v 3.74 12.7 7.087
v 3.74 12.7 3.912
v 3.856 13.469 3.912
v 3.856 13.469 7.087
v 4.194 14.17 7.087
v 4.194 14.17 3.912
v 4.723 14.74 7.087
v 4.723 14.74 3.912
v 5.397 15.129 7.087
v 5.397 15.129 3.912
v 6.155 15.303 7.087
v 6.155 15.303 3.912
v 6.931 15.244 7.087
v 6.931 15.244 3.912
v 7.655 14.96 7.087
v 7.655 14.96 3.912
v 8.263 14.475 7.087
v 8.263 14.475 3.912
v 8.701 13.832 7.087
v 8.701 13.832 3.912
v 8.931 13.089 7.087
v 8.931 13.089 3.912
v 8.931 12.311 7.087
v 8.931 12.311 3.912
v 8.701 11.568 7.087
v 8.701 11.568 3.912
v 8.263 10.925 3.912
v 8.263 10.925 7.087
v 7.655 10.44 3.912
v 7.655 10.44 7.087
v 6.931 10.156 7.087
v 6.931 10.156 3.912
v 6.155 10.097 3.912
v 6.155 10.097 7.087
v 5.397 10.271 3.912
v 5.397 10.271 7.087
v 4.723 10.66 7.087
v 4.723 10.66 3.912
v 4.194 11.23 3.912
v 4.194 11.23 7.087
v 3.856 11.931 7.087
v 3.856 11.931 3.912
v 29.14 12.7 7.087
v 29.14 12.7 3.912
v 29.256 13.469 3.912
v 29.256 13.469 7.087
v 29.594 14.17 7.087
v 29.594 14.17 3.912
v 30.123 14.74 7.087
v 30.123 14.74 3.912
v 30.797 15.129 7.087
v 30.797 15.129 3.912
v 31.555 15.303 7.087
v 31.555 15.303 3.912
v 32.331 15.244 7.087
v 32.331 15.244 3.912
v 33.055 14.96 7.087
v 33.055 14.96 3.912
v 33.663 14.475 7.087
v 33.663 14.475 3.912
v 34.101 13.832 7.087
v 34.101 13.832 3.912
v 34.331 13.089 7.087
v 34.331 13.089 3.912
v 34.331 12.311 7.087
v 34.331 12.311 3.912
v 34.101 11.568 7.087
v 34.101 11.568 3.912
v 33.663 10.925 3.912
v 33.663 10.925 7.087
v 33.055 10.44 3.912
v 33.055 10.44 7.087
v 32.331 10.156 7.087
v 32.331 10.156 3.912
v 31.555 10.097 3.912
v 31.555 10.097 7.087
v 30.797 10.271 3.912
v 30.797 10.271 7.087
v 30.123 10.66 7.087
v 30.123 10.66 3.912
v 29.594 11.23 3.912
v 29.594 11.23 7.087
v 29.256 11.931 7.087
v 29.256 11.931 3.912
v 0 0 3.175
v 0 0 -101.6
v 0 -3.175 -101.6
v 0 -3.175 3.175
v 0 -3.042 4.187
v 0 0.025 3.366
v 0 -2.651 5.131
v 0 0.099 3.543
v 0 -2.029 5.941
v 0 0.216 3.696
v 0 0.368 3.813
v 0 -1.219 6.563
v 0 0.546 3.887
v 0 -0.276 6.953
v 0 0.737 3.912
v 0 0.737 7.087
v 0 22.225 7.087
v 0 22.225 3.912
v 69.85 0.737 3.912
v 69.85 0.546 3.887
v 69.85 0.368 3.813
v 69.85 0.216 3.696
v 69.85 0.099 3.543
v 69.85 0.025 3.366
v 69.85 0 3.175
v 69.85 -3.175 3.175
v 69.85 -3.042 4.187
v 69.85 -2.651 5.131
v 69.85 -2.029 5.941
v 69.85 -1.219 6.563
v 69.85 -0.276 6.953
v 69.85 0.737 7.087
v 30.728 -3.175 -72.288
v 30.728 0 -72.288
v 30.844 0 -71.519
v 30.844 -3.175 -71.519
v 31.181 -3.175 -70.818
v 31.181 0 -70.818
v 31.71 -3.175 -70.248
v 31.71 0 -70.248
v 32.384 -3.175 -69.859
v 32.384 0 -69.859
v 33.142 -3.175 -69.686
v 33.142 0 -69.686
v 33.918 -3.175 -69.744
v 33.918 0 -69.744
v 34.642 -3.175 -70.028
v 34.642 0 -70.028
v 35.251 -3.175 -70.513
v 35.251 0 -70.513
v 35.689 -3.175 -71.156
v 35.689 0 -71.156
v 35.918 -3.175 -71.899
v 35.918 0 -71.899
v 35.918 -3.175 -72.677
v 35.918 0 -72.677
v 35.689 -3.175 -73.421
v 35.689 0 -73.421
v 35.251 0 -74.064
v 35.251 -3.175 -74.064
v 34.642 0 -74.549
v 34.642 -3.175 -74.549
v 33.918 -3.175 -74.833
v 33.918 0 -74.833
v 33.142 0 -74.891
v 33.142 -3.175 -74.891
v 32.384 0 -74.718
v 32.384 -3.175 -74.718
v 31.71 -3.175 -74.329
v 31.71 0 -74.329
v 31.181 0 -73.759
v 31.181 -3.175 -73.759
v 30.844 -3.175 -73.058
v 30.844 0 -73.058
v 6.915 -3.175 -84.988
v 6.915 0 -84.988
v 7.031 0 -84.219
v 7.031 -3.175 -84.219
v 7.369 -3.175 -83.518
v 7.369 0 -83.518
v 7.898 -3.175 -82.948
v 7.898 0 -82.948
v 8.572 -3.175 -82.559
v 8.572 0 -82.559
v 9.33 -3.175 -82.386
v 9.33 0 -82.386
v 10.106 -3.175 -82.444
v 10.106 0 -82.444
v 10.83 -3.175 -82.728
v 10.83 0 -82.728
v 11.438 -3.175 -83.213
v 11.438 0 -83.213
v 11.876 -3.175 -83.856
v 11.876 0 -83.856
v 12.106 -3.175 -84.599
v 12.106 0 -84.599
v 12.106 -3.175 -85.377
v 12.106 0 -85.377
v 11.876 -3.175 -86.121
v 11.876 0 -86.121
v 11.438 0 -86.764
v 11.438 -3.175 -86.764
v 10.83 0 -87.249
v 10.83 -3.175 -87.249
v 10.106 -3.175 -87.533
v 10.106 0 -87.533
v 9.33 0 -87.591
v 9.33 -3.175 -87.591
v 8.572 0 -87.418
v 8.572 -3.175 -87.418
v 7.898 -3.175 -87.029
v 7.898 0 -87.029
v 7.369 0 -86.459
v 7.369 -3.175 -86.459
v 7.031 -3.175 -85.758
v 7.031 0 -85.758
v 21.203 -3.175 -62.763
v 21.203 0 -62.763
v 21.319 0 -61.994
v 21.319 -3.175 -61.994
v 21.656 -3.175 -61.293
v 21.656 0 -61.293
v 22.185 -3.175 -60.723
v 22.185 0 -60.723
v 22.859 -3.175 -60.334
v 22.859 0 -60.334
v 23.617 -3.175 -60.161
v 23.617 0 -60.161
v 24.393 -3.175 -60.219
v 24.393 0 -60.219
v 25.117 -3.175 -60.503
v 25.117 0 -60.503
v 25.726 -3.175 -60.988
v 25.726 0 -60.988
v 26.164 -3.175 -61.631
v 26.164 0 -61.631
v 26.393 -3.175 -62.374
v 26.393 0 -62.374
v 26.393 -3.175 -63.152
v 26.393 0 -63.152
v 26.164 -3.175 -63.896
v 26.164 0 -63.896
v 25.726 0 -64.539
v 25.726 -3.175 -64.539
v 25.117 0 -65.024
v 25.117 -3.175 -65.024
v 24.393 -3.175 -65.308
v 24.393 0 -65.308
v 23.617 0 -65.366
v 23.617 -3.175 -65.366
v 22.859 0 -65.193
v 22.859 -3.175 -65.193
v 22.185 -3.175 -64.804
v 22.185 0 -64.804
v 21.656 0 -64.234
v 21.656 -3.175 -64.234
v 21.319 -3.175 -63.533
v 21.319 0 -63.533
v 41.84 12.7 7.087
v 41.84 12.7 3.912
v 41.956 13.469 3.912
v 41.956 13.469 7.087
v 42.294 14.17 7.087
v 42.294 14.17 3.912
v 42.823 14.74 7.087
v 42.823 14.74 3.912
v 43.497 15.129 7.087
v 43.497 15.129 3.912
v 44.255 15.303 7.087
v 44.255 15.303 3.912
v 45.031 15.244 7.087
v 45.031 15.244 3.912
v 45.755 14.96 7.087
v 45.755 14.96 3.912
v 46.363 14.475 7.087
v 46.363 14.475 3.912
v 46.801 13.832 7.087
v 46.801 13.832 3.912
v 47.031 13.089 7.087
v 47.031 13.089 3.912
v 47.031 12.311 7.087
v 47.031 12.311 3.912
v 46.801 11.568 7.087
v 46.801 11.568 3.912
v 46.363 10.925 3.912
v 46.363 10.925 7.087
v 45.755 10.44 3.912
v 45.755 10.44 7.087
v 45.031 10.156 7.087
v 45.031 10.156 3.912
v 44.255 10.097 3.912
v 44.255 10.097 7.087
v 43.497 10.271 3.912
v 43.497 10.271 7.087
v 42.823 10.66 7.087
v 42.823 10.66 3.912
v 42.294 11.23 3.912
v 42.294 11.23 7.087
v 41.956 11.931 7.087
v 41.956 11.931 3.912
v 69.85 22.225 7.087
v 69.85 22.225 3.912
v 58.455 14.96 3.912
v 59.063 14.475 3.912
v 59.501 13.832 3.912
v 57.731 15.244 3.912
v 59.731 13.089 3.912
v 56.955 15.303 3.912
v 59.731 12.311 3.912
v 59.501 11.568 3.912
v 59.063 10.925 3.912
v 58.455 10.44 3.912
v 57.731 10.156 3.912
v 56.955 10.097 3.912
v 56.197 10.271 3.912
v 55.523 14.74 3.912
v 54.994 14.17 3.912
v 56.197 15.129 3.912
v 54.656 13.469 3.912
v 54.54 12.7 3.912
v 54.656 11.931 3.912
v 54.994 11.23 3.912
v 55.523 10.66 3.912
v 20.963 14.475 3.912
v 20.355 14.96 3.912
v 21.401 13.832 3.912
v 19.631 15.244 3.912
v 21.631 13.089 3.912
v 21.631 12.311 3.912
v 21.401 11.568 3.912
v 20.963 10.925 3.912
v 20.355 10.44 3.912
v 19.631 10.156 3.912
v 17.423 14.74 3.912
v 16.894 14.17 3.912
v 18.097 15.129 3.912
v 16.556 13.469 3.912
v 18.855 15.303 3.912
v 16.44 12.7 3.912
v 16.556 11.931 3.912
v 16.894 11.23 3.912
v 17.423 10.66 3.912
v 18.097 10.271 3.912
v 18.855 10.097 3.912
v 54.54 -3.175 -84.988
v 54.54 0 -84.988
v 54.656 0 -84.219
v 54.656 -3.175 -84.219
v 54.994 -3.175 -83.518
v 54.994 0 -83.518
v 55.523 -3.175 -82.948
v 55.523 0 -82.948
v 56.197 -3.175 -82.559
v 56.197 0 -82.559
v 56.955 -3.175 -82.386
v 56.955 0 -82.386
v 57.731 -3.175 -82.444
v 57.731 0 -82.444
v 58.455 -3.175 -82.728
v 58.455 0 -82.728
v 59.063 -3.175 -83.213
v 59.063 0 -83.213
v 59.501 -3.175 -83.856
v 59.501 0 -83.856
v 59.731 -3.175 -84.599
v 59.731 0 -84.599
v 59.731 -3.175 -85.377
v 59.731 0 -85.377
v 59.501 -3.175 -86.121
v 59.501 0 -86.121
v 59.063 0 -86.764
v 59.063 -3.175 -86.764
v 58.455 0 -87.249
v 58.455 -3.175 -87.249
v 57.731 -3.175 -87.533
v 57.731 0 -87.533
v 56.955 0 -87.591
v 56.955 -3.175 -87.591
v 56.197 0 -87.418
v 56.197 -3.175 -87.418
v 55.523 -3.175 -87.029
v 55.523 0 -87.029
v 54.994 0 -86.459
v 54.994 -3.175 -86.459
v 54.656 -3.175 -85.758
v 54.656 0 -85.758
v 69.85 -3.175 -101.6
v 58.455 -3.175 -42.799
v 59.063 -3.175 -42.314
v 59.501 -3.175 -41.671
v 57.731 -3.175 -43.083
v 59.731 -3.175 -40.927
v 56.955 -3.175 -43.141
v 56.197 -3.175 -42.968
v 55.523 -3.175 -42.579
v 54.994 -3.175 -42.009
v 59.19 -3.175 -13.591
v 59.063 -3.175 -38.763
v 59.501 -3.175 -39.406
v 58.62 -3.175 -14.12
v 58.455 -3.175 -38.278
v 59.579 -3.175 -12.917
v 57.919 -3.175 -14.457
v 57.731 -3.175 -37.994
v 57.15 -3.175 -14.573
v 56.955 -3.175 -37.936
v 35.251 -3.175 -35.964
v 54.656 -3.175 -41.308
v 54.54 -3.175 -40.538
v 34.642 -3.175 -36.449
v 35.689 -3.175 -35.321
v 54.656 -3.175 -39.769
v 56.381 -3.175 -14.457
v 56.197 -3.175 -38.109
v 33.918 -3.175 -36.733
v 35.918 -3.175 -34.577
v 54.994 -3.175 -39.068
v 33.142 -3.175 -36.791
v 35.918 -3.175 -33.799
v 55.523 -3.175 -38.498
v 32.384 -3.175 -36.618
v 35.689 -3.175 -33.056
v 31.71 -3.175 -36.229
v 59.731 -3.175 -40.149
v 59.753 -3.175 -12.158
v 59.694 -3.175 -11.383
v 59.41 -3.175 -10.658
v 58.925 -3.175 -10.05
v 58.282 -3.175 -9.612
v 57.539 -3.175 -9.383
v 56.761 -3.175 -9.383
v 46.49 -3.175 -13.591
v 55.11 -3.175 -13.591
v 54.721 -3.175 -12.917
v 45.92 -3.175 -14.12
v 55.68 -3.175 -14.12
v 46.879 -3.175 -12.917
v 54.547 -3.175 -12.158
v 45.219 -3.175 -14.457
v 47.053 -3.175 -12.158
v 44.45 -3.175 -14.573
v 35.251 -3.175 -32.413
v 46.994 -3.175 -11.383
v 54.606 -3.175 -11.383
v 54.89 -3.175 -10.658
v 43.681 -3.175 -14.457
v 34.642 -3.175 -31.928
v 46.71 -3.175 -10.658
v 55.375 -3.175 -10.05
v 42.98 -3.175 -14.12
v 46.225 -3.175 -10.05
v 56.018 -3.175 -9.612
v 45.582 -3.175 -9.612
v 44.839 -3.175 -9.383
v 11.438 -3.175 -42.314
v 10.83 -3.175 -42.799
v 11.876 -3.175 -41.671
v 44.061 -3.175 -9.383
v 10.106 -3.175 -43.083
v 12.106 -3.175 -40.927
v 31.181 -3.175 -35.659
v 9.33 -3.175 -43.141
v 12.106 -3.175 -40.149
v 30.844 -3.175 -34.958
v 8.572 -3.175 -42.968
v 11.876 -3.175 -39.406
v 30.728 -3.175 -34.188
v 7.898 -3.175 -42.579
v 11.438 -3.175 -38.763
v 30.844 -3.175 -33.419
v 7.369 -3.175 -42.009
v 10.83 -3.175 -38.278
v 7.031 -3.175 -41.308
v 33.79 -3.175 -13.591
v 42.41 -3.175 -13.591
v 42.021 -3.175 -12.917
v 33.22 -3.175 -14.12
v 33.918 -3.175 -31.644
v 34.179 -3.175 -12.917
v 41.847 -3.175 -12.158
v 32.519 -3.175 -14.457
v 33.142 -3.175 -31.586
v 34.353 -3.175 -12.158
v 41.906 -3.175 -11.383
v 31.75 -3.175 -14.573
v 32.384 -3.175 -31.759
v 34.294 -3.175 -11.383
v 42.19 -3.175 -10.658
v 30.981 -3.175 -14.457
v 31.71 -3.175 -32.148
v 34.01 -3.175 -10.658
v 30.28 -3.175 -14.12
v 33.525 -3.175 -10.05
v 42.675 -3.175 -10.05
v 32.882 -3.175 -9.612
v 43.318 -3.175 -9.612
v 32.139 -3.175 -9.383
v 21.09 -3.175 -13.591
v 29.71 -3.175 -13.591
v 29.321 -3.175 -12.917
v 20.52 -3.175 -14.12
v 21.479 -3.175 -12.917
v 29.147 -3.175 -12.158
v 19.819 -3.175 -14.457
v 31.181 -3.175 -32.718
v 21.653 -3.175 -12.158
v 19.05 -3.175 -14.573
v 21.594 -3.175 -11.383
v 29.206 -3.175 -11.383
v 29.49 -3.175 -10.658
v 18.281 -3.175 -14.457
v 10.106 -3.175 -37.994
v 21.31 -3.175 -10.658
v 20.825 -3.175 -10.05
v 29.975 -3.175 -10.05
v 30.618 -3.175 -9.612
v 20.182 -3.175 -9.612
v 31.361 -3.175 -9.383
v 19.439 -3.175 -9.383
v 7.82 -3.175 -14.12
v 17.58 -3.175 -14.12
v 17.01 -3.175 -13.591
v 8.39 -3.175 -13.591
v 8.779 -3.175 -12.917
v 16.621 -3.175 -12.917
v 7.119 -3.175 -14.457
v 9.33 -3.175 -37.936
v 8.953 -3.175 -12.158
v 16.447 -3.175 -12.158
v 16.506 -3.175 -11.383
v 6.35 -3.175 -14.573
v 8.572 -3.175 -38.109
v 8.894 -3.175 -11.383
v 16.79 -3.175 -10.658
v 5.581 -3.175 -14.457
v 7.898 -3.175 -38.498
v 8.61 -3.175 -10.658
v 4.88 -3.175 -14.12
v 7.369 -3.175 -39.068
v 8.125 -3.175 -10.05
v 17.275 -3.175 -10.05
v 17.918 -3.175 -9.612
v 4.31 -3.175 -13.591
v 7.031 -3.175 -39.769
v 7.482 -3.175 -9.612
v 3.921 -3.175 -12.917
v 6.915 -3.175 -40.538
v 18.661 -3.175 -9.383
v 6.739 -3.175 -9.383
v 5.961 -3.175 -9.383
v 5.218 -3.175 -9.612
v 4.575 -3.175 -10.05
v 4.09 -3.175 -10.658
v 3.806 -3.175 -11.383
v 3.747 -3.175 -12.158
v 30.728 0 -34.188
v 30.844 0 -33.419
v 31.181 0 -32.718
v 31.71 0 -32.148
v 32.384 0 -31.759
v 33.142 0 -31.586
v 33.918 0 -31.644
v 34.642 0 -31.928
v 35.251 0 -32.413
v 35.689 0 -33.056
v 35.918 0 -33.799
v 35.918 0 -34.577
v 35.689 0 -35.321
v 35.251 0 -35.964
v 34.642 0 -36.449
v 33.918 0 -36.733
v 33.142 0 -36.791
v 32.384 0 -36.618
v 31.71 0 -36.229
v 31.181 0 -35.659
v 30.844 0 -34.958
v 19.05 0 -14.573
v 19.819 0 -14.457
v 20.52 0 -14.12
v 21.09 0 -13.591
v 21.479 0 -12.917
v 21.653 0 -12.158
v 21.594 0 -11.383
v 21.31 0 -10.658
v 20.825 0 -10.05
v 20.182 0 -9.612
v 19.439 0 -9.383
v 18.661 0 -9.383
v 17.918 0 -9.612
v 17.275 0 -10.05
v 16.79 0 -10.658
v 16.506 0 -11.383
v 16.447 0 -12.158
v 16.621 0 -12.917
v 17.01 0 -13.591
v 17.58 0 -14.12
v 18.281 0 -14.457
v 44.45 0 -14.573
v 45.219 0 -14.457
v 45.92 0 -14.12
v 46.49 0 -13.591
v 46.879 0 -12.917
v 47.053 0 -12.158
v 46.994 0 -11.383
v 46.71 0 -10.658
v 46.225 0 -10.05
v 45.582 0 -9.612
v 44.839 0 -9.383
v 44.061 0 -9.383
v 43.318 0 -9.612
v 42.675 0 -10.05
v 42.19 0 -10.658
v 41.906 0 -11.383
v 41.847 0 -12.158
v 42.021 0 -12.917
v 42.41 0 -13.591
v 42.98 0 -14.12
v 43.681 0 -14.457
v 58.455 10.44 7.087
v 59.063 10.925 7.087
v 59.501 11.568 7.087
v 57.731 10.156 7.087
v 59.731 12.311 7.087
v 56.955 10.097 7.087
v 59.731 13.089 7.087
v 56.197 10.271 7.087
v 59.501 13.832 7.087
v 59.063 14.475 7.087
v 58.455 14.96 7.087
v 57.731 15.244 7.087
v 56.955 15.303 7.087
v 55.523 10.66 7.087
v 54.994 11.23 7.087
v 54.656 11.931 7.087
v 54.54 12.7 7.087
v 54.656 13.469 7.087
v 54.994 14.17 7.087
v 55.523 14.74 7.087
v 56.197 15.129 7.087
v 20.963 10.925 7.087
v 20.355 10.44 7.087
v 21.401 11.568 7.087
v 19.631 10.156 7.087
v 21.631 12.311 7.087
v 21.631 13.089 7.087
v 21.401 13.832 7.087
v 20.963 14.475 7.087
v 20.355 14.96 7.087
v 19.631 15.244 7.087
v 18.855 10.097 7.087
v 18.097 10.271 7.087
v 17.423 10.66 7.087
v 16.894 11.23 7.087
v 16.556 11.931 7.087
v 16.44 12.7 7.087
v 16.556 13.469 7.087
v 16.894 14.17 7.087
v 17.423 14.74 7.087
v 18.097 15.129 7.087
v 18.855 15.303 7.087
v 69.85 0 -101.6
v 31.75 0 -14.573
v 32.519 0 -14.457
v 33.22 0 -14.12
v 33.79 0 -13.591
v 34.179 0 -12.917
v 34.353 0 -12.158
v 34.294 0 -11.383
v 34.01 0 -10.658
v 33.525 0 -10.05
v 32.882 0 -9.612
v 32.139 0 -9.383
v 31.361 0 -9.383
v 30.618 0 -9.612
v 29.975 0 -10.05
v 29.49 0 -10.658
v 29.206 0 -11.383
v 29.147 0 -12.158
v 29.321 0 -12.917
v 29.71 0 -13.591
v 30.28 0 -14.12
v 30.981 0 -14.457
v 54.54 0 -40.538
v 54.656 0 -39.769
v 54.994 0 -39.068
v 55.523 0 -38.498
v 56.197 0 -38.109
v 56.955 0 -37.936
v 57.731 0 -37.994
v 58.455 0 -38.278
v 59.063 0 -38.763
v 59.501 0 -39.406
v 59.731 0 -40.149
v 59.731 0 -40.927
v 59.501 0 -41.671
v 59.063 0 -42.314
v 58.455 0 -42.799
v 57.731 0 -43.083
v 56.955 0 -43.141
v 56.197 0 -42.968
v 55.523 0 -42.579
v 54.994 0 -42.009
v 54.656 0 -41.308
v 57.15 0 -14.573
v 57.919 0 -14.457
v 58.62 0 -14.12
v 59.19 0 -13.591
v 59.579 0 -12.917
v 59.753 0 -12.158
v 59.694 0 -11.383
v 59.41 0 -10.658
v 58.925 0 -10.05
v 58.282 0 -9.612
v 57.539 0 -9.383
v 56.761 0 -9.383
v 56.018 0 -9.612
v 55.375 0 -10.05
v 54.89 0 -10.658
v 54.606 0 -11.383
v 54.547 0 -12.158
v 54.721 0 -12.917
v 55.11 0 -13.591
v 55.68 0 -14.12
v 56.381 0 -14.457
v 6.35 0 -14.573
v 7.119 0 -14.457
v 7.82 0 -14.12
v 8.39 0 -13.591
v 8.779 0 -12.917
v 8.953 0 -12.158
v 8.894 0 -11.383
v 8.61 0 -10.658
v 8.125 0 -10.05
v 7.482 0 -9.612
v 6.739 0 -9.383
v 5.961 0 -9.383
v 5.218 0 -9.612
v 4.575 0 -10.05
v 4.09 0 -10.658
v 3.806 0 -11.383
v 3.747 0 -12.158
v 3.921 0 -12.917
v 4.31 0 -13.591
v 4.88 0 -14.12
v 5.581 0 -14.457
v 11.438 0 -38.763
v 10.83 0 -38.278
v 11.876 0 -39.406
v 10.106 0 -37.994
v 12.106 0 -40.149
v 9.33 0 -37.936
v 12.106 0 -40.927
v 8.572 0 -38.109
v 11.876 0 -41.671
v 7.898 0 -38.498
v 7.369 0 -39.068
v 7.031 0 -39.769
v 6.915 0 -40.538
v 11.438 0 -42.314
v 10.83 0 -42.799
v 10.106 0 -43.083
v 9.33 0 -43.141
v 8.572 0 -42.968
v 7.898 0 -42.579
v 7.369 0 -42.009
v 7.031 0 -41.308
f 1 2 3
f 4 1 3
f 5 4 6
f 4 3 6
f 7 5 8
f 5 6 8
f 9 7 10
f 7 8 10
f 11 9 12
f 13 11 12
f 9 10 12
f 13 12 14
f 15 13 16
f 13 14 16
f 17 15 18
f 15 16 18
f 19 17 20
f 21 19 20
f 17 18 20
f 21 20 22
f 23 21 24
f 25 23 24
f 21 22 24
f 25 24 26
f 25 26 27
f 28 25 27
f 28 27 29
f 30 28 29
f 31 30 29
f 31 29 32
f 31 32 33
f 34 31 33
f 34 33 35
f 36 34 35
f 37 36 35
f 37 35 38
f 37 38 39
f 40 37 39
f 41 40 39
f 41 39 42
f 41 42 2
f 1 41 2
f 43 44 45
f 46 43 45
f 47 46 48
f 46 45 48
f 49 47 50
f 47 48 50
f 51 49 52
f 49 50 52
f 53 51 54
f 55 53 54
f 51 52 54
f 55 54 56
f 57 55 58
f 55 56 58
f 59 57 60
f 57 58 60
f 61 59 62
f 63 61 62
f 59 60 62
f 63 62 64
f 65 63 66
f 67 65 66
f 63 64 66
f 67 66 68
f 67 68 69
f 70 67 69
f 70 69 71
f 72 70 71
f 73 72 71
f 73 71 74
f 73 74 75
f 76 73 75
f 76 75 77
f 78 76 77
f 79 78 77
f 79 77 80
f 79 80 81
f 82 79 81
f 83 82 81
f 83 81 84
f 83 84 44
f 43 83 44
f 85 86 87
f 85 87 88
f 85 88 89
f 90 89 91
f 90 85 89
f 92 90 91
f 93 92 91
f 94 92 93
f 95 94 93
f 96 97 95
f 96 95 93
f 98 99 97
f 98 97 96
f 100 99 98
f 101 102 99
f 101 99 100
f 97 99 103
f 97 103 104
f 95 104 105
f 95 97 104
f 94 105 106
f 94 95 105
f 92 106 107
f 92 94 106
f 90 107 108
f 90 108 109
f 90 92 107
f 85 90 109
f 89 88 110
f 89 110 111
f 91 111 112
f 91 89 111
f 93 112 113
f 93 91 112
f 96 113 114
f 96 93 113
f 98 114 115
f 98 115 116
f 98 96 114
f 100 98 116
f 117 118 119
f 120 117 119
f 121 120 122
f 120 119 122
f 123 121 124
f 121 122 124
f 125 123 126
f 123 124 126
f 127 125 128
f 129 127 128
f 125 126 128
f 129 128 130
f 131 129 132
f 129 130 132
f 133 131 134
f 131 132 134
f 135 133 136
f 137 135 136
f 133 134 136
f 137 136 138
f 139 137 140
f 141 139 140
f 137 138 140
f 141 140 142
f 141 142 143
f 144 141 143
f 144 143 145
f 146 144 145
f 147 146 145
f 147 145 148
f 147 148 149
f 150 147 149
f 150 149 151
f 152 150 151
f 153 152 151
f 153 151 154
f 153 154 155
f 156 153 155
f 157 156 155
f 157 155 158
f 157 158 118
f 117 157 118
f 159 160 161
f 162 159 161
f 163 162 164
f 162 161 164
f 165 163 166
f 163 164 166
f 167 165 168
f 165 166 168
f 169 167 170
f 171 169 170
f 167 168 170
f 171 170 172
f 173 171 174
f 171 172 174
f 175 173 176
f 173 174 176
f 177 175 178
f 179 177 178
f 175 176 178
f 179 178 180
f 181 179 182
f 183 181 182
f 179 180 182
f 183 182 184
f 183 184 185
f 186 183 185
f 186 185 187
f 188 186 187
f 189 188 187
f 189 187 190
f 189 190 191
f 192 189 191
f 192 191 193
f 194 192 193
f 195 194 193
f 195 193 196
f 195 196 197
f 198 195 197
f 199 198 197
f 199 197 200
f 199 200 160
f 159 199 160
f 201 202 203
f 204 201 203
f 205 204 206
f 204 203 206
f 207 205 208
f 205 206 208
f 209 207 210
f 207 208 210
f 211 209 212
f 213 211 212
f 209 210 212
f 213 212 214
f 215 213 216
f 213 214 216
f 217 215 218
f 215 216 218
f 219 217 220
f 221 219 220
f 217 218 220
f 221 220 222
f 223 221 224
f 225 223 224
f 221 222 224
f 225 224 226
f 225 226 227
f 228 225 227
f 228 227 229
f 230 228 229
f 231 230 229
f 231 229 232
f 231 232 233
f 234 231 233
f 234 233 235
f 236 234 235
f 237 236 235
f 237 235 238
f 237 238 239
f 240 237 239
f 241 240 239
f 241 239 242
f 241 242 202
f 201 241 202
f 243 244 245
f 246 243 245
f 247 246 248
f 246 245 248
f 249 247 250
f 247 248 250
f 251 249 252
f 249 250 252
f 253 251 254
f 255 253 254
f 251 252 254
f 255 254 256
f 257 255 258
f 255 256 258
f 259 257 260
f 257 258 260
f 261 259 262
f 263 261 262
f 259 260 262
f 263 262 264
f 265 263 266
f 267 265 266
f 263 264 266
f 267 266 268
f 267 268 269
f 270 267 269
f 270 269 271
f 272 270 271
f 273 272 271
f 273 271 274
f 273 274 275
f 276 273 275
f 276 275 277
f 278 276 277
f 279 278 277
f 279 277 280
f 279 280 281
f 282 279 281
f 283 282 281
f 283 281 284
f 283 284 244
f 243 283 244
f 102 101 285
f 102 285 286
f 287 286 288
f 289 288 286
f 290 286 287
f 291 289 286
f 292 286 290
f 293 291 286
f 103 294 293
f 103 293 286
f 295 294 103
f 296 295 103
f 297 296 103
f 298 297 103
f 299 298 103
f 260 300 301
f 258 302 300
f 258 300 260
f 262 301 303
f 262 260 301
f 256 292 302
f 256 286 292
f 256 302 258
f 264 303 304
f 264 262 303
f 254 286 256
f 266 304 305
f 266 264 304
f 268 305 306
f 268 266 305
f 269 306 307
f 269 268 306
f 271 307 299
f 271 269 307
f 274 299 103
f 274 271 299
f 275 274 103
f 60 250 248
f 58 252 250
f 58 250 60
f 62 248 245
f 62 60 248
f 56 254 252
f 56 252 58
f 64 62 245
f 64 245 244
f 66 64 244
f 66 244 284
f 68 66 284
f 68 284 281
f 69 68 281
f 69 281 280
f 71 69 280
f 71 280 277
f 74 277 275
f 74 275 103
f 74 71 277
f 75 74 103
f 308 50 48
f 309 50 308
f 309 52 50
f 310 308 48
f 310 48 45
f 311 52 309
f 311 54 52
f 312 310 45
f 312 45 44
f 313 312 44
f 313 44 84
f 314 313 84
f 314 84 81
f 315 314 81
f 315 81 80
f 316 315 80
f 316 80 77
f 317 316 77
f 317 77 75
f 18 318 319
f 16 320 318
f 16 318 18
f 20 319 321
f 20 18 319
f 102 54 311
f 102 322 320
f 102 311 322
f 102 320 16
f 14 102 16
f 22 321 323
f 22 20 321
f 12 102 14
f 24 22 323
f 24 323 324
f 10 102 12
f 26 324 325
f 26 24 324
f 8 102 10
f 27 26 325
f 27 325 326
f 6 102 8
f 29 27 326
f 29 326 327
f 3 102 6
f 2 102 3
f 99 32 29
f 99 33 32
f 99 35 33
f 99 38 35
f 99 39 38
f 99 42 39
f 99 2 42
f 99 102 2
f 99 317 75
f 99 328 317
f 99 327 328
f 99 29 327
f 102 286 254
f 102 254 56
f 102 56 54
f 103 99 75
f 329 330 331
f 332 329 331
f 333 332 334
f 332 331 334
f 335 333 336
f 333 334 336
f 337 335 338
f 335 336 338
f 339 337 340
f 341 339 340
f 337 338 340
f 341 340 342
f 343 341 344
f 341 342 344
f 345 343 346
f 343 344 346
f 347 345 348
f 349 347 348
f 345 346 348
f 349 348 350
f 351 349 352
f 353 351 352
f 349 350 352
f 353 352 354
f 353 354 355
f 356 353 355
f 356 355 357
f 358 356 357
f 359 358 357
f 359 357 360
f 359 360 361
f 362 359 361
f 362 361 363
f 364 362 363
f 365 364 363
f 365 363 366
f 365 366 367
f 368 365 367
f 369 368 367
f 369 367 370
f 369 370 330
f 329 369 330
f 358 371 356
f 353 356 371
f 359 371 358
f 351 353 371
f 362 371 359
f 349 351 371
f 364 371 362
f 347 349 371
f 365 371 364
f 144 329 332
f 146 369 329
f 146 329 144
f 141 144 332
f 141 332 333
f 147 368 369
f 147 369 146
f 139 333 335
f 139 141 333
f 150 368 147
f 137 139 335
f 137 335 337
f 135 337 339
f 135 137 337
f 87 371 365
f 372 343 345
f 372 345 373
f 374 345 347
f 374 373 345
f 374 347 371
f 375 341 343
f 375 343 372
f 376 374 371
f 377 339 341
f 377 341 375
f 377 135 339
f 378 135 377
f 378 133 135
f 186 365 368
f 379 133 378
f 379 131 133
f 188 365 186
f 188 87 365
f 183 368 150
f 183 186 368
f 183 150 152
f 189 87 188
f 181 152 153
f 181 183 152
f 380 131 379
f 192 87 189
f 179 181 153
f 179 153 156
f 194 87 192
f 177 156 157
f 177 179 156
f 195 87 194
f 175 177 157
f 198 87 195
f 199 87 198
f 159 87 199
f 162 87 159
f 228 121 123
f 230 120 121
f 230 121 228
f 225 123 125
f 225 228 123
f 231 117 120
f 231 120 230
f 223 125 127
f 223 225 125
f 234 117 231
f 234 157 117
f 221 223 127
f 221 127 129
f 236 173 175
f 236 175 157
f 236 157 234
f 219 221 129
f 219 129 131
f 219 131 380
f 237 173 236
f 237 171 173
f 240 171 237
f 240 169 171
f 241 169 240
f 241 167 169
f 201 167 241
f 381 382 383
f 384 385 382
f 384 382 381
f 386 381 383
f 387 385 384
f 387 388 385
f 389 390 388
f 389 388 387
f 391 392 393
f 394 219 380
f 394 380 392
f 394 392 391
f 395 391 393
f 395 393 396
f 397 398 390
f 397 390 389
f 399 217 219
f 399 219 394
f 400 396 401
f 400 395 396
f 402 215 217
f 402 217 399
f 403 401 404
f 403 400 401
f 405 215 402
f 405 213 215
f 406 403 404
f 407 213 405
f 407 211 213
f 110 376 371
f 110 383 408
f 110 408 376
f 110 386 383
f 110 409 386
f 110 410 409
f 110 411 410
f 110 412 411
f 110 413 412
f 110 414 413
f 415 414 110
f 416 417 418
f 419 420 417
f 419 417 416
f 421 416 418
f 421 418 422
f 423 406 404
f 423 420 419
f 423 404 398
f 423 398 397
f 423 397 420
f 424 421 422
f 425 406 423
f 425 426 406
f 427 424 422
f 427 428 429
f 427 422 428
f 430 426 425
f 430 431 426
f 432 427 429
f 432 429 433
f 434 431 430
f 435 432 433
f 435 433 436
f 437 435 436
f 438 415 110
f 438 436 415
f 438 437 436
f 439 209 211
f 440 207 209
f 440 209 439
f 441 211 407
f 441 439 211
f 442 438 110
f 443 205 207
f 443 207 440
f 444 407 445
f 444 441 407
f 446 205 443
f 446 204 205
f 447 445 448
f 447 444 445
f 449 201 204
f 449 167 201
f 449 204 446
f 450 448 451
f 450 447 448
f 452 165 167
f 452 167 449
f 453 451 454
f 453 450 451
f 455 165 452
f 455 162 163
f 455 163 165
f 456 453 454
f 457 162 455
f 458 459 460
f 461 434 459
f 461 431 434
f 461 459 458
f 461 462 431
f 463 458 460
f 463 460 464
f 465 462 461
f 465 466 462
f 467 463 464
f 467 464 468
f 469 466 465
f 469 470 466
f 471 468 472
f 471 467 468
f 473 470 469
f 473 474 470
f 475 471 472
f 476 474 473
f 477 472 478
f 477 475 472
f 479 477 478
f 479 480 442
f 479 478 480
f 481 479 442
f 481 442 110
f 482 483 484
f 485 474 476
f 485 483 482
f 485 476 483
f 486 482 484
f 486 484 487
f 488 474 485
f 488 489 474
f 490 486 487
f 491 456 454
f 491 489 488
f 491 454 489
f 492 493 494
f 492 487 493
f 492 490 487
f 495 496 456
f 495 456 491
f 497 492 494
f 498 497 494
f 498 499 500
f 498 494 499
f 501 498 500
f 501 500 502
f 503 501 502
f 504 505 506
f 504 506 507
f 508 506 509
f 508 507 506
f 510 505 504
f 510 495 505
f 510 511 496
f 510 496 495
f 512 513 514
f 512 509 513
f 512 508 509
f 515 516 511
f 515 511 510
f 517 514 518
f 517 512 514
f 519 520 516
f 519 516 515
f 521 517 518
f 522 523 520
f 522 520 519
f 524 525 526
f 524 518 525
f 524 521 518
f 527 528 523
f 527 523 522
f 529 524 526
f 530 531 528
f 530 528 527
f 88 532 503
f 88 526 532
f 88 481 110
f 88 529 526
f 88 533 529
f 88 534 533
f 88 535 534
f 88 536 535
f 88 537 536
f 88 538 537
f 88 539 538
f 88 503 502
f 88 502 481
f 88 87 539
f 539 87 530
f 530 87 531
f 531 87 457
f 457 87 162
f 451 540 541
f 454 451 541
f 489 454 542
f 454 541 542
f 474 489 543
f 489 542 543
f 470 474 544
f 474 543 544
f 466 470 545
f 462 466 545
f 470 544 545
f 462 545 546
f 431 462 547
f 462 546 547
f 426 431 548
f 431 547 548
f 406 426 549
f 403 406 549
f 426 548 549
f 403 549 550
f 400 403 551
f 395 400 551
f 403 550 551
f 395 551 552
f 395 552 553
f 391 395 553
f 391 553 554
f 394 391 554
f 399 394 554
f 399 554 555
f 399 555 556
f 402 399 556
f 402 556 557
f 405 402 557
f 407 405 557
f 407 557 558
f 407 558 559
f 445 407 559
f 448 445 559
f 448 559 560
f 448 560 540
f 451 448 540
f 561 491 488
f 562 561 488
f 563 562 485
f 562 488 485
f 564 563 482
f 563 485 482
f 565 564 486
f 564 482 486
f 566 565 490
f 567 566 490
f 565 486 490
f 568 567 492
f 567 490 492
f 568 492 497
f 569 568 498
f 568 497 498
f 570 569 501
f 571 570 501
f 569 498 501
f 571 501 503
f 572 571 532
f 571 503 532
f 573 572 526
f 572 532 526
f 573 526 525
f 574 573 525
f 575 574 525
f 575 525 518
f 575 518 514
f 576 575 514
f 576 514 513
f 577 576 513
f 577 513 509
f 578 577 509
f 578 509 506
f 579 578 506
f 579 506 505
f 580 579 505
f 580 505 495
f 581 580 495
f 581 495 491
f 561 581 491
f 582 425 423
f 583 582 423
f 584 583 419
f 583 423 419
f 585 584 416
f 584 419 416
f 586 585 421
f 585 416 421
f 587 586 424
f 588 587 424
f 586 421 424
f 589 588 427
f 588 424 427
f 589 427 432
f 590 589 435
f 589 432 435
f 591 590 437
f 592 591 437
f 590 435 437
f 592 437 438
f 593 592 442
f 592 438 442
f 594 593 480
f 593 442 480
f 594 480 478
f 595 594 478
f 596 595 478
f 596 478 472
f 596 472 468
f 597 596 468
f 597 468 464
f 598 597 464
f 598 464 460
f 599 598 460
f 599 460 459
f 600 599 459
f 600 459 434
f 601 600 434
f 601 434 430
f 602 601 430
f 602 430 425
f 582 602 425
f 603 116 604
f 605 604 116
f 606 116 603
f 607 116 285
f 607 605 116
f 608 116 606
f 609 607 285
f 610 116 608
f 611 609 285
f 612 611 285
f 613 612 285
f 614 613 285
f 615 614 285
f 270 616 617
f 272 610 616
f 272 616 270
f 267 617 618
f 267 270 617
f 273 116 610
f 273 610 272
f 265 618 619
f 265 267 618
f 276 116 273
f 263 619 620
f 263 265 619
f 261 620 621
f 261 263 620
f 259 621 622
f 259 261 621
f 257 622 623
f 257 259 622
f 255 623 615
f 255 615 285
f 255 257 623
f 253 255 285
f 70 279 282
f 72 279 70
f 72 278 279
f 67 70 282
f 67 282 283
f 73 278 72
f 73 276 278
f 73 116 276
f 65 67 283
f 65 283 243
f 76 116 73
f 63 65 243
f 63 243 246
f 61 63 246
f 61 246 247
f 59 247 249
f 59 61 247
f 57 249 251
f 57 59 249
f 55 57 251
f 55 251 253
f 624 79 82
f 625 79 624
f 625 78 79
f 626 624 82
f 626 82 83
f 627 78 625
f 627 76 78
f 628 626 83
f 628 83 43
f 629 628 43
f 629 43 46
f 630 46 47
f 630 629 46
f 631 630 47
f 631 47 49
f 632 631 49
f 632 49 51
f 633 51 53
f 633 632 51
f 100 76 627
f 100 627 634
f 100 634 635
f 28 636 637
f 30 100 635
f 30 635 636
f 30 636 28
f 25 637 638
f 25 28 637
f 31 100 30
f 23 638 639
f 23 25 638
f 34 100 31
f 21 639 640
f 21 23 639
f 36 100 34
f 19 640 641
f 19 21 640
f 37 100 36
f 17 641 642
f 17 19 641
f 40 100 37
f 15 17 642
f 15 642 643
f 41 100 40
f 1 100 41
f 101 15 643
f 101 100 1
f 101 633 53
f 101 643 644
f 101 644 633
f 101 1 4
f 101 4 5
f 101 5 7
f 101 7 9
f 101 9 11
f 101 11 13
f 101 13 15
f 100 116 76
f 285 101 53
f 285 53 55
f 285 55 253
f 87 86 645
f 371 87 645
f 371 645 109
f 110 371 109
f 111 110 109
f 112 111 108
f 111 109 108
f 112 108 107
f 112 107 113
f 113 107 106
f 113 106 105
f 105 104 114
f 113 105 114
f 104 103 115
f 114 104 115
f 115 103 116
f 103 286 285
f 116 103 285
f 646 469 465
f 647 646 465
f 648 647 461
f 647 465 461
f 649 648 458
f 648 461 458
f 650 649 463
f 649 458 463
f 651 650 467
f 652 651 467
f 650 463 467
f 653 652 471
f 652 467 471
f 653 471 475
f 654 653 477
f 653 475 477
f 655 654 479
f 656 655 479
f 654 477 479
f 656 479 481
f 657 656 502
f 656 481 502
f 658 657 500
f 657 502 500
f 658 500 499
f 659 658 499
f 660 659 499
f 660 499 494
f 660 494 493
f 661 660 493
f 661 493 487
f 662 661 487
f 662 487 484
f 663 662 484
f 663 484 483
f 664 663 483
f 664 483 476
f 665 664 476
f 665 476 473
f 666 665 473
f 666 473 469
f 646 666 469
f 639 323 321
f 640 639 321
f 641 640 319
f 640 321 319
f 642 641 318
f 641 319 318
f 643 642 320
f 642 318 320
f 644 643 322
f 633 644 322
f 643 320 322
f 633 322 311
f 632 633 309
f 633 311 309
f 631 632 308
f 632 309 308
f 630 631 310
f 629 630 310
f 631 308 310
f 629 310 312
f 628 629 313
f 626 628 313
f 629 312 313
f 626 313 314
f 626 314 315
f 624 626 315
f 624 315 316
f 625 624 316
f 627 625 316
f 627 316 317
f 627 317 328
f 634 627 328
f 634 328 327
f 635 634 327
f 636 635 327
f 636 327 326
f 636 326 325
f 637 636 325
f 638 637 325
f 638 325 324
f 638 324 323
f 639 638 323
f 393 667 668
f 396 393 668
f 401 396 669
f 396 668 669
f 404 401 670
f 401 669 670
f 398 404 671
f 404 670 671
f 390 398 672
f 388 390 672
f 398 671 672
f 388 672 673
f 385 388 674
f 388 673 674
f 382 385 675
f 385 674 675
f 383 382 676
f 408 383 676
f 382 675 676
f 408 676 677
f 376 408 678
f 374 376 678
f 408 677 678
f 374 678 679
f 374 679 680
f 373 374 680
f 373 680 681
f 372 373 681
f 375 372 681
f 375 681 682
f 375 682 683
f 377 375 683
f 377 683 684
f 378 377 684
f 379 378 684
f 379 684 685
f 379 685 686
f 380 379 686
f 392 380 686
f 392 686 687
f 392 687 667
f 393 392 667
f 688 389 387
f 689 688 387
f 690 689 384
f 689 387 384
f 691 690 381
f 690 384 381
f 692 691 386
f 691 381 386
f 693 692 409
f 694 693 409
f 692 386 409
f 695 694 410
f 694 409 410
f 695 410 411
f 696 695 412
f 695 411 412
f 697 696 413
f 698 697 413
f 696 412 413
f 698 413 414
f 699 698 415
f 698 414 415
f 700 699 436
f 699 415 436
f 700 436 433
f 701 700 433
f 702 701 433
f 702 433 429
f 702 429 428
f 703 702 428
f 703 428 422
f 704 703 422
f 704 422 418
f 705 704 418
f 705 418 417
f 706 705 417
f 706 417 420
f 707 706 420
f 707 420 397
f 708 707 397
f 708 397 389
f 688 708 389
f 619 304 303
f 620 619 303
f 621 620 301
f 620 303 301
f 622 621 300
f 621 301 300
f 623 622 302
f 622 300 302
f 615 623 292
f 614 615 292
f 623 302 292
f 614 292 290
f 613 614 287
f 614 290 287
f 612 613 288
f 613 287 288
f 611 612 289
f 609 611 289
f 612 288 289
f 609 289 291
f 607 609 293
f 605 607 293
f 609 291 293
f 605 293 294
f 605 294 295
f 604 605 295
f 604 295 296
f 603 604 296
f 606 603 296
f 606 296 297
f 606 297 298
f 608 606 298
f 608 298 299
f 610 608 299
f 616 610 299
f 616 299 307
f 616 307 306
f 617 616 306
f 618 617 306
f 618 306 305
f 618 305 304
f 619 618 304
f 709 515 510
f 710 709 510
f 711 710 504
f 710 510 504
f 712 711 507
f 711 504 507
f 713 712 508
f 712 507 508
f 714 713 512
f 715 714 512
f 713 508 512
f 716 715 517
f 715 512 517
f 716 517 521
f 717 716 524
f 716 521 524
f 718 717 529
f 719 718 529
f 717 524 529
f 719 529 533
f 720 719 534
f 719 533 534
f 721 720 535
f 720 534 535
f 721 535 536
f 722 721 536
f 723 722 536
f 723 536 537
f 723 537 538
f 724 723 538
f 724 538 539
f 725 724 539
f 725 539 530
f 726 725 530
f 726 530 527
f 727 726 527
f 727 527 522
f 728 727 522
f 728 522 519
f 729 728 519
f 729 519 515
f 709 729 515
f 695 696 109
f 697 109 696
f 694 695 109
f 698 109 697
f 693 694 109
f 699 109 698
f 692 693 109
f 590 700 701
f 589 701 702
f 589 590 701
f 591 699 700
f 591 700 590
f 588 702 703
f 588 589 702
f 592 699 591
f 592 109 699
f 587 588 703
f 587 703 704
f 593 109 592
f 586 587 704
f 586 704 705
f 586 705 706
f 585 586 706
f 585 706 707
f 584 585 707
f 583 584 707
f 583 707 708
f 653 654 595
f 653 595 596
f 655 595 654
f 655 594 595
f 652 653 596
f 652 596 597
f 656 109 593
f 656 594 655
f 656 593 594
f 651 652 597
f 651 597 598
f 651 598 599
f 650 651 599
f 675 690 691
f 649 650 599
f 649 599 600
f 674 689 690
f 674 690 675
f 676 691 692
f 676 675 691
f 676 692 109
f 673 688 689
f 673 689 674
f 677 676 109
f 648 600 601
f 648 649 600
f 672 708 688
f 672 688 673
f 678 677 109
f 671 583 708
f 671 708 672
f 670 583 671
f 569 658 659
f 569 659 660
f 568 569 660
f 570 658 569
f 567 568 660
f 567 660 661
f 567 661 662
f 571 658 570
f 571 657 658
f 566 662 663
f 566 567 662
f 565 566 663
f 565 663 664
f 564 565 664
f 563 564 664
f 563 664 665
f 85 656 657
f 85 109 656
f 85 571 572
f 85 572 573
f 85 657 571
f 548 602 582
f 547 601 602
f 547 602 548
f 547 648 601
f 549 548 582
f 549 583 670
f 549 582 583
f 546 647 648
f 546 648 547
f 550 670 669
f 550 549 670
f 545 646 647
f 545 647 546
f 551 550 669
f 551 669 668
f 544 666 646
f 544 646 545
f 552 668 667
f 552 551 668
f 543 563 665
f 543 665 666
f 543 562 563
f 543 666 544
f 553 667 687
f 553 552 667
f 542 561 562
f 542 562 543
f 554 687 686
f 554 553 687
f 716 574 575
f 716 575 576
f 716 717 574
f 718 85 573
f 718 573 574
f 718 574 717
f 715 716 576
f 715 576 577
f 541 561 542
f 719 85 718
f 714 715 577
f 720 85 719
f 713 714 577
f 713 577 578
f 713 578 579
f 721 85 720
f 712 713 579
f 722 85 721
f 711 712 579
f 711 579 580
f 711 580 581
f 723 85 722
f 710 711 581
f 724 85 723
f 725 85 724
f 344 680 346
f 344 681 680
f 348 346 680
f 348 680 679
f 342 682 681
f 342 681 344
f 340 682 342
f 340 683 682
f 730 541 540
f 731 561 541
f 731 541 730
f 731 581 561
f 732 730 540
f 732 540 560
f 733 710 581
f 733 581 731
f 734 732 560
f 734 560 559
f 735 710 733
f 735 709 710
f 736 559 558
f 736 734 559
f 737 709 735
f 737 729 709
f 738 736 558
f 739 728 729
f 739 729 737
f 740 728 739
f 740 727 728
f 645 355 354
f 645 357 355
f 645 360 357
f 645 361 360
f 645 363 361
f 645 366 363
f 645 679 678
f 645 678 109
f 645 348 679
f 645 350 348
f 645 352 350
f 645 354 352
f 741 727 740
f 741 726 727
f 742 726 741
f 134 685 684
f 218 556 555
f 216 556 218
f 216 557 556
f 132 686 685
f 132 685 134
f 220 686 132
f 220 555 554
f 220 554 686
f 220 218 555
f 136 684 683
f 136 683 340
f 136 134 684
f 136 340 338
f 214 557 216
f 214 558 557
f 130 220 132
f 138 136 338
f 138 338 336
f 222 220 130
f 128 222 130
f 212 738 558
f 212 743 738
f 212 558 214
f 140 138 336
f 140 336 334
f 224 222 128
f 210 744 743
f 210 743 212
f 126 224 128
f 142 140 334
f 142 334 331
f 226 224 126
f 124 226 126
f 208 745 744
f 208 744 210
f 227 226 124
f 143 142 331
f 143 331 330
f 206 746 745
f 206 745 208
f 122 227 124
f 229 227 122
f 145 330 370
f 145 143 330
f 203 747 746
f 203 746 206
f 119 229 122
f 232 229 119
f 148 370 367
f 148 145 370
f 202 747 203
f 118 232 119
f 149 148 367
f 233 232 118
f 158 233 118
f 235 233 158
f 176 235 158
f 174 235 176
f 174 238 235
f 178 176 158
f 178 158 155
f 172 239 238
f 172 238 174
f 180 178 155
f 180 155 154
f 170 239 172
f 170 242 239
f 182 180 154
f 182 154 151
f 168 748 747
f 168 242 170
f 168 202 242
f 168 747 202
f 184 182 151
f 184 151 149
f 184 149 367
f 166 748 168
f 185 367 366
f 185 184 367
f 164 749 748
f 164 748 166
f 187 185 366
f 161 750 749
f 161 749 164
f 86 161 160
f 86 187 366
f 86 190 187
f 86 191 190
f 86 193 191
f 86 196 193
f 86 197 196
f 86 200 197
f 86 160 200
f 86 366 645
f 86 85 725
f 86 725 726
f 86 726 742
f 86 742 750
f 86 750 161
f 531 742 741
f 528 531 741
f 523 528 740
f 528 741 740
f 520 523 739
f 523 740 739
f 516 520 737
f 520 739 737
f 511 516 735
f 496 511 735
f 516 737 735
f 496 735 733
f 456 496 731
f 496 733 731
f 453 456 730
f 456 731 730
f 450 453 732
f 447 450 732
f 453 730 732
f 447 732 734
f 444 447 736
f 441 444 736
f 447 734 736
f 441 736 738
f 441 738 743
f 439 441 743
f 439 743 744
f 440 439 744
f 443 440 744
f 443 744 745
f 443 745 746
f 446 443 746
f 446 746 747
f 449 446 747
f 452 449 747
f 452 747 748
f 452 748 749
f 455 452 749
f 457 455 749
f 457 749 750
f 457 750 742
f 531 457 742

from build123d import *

# Parameters (mm, degrees)
SKETCH1_W                   = 69.85
SKETCH1_H                   = 101.6
BASE_FLANGE1_DEPTH          = 3.175
EDGE_FLANGE1_DEPTH          = 69.85
F_5_0_2055_DIAMETER_HOLE1_D = 5.2197
F_5_0_2055_DIAMETER_HOLE3_D = 5.2197
SKETCH21_R                  = 2.60985
CUT_EXTRUDE1_DEPTH          = 126.88384527


# Sheet-metal steps are written as plain solids
with BuildPart() as part:
    # Sketch1 → Base-Flange1 (new body)
    with BuildSketch(Plane(origin=(0, 0, 0), x_dir=(1, 0, 0), z_dir=(0, 1, 0))):
        with Locations((34.925, 50.8)):
            Rectangle(SKETCH1_W, SKETCH1_H)
    extrude(amount=-BASE_FLANGE1_DEPTH)

    # Edge-Flange1 section (across the edge) → Edge-Flange1 (add)
    with BuildSketch(Plane(origin=(0, 0, 3.9116), x_dir=(0, 0, -1), z_dir=(1, 0, 0))):
        with BuildLine():
            Line((-3.175, 0.7366), (-3.175, 22.225))
            Line((-3.175, 22.225), (0, 22.225))
            Line((0, 22.225), (0, 0.7366))
            ThreePointArc((0, 0.7366), (0.215745145, 0.215745145), (0.7366, 0))
            Line((0.7366, 0), (3.9116, 0))
            Line((3.9116, 0), (3.9116, -3.175))
            Line((3.9116, -3.175), (0.7366, -3.175))
            ThreePointArc((0.7366, -3.175), (-2.029318885, -2.029318885), (-3.175, 0.7366))
        make_face()
    extrude(amount=EDGE_FLANGE1_DEPTH)

    # #5 (0.2055) Diameter Hole1 (through all)
    with Locations(Plane.XZ.offset(3.175)):
        with Locations((33.3375, -34.1884), (23.8125, -62.7634), (33.3375, -72.2884), (57.15, -84.9884), (57.15, -40.5384), (9.525, -40.5384), (9.525, -84.9884)):
            Hole(F_5_0_2055_DIAMETER_HOLE1_D / 2)

    # #5 (0.2055) Diameter Hole3 (through all)
    with Locations(Plane.XY.offset(7.0866)):
        with Locations((6.35, 12.7), (19.05, 12.7), (31.75, 12.7), (44.45, 12.7), (57.15, 12.7)):
            Hole(F_5_0_2055_DIAMETER_HOLE3_D / 2)

    # Sketch21 → Cut-Extrude1 (cut, through all)
    with BuildSketch(Plane.XZ.offset(3.175)):
        with Locations(Location((19.050000049, -11.9634, 0), (0, 0, 270))):
            Circle(SKETCH21_R)
        with Locations(Location((6.350000049, -11.9634, 0), (0, 0, 270))):
            Circle(SKETCH21_R)
        with Locations(Location((31.750000049, -11.9634, 0), (0, 0, 270))):
            Circle(SKETCH21_R)
        with Locations(Location((44.450000049, -11.9634, 0), (0, 0, 270))):
            Circle(SKETCH21_R)
        with Locations(Location((57.150000049, -11.9634, 0), (0, 0, 270))):
            Circle(SKETCH21_R)
    extrude(amount=-CUT_EXTRUDE1_DEPTH, mode=Mode.SUBTRACT)


solid = part.part
